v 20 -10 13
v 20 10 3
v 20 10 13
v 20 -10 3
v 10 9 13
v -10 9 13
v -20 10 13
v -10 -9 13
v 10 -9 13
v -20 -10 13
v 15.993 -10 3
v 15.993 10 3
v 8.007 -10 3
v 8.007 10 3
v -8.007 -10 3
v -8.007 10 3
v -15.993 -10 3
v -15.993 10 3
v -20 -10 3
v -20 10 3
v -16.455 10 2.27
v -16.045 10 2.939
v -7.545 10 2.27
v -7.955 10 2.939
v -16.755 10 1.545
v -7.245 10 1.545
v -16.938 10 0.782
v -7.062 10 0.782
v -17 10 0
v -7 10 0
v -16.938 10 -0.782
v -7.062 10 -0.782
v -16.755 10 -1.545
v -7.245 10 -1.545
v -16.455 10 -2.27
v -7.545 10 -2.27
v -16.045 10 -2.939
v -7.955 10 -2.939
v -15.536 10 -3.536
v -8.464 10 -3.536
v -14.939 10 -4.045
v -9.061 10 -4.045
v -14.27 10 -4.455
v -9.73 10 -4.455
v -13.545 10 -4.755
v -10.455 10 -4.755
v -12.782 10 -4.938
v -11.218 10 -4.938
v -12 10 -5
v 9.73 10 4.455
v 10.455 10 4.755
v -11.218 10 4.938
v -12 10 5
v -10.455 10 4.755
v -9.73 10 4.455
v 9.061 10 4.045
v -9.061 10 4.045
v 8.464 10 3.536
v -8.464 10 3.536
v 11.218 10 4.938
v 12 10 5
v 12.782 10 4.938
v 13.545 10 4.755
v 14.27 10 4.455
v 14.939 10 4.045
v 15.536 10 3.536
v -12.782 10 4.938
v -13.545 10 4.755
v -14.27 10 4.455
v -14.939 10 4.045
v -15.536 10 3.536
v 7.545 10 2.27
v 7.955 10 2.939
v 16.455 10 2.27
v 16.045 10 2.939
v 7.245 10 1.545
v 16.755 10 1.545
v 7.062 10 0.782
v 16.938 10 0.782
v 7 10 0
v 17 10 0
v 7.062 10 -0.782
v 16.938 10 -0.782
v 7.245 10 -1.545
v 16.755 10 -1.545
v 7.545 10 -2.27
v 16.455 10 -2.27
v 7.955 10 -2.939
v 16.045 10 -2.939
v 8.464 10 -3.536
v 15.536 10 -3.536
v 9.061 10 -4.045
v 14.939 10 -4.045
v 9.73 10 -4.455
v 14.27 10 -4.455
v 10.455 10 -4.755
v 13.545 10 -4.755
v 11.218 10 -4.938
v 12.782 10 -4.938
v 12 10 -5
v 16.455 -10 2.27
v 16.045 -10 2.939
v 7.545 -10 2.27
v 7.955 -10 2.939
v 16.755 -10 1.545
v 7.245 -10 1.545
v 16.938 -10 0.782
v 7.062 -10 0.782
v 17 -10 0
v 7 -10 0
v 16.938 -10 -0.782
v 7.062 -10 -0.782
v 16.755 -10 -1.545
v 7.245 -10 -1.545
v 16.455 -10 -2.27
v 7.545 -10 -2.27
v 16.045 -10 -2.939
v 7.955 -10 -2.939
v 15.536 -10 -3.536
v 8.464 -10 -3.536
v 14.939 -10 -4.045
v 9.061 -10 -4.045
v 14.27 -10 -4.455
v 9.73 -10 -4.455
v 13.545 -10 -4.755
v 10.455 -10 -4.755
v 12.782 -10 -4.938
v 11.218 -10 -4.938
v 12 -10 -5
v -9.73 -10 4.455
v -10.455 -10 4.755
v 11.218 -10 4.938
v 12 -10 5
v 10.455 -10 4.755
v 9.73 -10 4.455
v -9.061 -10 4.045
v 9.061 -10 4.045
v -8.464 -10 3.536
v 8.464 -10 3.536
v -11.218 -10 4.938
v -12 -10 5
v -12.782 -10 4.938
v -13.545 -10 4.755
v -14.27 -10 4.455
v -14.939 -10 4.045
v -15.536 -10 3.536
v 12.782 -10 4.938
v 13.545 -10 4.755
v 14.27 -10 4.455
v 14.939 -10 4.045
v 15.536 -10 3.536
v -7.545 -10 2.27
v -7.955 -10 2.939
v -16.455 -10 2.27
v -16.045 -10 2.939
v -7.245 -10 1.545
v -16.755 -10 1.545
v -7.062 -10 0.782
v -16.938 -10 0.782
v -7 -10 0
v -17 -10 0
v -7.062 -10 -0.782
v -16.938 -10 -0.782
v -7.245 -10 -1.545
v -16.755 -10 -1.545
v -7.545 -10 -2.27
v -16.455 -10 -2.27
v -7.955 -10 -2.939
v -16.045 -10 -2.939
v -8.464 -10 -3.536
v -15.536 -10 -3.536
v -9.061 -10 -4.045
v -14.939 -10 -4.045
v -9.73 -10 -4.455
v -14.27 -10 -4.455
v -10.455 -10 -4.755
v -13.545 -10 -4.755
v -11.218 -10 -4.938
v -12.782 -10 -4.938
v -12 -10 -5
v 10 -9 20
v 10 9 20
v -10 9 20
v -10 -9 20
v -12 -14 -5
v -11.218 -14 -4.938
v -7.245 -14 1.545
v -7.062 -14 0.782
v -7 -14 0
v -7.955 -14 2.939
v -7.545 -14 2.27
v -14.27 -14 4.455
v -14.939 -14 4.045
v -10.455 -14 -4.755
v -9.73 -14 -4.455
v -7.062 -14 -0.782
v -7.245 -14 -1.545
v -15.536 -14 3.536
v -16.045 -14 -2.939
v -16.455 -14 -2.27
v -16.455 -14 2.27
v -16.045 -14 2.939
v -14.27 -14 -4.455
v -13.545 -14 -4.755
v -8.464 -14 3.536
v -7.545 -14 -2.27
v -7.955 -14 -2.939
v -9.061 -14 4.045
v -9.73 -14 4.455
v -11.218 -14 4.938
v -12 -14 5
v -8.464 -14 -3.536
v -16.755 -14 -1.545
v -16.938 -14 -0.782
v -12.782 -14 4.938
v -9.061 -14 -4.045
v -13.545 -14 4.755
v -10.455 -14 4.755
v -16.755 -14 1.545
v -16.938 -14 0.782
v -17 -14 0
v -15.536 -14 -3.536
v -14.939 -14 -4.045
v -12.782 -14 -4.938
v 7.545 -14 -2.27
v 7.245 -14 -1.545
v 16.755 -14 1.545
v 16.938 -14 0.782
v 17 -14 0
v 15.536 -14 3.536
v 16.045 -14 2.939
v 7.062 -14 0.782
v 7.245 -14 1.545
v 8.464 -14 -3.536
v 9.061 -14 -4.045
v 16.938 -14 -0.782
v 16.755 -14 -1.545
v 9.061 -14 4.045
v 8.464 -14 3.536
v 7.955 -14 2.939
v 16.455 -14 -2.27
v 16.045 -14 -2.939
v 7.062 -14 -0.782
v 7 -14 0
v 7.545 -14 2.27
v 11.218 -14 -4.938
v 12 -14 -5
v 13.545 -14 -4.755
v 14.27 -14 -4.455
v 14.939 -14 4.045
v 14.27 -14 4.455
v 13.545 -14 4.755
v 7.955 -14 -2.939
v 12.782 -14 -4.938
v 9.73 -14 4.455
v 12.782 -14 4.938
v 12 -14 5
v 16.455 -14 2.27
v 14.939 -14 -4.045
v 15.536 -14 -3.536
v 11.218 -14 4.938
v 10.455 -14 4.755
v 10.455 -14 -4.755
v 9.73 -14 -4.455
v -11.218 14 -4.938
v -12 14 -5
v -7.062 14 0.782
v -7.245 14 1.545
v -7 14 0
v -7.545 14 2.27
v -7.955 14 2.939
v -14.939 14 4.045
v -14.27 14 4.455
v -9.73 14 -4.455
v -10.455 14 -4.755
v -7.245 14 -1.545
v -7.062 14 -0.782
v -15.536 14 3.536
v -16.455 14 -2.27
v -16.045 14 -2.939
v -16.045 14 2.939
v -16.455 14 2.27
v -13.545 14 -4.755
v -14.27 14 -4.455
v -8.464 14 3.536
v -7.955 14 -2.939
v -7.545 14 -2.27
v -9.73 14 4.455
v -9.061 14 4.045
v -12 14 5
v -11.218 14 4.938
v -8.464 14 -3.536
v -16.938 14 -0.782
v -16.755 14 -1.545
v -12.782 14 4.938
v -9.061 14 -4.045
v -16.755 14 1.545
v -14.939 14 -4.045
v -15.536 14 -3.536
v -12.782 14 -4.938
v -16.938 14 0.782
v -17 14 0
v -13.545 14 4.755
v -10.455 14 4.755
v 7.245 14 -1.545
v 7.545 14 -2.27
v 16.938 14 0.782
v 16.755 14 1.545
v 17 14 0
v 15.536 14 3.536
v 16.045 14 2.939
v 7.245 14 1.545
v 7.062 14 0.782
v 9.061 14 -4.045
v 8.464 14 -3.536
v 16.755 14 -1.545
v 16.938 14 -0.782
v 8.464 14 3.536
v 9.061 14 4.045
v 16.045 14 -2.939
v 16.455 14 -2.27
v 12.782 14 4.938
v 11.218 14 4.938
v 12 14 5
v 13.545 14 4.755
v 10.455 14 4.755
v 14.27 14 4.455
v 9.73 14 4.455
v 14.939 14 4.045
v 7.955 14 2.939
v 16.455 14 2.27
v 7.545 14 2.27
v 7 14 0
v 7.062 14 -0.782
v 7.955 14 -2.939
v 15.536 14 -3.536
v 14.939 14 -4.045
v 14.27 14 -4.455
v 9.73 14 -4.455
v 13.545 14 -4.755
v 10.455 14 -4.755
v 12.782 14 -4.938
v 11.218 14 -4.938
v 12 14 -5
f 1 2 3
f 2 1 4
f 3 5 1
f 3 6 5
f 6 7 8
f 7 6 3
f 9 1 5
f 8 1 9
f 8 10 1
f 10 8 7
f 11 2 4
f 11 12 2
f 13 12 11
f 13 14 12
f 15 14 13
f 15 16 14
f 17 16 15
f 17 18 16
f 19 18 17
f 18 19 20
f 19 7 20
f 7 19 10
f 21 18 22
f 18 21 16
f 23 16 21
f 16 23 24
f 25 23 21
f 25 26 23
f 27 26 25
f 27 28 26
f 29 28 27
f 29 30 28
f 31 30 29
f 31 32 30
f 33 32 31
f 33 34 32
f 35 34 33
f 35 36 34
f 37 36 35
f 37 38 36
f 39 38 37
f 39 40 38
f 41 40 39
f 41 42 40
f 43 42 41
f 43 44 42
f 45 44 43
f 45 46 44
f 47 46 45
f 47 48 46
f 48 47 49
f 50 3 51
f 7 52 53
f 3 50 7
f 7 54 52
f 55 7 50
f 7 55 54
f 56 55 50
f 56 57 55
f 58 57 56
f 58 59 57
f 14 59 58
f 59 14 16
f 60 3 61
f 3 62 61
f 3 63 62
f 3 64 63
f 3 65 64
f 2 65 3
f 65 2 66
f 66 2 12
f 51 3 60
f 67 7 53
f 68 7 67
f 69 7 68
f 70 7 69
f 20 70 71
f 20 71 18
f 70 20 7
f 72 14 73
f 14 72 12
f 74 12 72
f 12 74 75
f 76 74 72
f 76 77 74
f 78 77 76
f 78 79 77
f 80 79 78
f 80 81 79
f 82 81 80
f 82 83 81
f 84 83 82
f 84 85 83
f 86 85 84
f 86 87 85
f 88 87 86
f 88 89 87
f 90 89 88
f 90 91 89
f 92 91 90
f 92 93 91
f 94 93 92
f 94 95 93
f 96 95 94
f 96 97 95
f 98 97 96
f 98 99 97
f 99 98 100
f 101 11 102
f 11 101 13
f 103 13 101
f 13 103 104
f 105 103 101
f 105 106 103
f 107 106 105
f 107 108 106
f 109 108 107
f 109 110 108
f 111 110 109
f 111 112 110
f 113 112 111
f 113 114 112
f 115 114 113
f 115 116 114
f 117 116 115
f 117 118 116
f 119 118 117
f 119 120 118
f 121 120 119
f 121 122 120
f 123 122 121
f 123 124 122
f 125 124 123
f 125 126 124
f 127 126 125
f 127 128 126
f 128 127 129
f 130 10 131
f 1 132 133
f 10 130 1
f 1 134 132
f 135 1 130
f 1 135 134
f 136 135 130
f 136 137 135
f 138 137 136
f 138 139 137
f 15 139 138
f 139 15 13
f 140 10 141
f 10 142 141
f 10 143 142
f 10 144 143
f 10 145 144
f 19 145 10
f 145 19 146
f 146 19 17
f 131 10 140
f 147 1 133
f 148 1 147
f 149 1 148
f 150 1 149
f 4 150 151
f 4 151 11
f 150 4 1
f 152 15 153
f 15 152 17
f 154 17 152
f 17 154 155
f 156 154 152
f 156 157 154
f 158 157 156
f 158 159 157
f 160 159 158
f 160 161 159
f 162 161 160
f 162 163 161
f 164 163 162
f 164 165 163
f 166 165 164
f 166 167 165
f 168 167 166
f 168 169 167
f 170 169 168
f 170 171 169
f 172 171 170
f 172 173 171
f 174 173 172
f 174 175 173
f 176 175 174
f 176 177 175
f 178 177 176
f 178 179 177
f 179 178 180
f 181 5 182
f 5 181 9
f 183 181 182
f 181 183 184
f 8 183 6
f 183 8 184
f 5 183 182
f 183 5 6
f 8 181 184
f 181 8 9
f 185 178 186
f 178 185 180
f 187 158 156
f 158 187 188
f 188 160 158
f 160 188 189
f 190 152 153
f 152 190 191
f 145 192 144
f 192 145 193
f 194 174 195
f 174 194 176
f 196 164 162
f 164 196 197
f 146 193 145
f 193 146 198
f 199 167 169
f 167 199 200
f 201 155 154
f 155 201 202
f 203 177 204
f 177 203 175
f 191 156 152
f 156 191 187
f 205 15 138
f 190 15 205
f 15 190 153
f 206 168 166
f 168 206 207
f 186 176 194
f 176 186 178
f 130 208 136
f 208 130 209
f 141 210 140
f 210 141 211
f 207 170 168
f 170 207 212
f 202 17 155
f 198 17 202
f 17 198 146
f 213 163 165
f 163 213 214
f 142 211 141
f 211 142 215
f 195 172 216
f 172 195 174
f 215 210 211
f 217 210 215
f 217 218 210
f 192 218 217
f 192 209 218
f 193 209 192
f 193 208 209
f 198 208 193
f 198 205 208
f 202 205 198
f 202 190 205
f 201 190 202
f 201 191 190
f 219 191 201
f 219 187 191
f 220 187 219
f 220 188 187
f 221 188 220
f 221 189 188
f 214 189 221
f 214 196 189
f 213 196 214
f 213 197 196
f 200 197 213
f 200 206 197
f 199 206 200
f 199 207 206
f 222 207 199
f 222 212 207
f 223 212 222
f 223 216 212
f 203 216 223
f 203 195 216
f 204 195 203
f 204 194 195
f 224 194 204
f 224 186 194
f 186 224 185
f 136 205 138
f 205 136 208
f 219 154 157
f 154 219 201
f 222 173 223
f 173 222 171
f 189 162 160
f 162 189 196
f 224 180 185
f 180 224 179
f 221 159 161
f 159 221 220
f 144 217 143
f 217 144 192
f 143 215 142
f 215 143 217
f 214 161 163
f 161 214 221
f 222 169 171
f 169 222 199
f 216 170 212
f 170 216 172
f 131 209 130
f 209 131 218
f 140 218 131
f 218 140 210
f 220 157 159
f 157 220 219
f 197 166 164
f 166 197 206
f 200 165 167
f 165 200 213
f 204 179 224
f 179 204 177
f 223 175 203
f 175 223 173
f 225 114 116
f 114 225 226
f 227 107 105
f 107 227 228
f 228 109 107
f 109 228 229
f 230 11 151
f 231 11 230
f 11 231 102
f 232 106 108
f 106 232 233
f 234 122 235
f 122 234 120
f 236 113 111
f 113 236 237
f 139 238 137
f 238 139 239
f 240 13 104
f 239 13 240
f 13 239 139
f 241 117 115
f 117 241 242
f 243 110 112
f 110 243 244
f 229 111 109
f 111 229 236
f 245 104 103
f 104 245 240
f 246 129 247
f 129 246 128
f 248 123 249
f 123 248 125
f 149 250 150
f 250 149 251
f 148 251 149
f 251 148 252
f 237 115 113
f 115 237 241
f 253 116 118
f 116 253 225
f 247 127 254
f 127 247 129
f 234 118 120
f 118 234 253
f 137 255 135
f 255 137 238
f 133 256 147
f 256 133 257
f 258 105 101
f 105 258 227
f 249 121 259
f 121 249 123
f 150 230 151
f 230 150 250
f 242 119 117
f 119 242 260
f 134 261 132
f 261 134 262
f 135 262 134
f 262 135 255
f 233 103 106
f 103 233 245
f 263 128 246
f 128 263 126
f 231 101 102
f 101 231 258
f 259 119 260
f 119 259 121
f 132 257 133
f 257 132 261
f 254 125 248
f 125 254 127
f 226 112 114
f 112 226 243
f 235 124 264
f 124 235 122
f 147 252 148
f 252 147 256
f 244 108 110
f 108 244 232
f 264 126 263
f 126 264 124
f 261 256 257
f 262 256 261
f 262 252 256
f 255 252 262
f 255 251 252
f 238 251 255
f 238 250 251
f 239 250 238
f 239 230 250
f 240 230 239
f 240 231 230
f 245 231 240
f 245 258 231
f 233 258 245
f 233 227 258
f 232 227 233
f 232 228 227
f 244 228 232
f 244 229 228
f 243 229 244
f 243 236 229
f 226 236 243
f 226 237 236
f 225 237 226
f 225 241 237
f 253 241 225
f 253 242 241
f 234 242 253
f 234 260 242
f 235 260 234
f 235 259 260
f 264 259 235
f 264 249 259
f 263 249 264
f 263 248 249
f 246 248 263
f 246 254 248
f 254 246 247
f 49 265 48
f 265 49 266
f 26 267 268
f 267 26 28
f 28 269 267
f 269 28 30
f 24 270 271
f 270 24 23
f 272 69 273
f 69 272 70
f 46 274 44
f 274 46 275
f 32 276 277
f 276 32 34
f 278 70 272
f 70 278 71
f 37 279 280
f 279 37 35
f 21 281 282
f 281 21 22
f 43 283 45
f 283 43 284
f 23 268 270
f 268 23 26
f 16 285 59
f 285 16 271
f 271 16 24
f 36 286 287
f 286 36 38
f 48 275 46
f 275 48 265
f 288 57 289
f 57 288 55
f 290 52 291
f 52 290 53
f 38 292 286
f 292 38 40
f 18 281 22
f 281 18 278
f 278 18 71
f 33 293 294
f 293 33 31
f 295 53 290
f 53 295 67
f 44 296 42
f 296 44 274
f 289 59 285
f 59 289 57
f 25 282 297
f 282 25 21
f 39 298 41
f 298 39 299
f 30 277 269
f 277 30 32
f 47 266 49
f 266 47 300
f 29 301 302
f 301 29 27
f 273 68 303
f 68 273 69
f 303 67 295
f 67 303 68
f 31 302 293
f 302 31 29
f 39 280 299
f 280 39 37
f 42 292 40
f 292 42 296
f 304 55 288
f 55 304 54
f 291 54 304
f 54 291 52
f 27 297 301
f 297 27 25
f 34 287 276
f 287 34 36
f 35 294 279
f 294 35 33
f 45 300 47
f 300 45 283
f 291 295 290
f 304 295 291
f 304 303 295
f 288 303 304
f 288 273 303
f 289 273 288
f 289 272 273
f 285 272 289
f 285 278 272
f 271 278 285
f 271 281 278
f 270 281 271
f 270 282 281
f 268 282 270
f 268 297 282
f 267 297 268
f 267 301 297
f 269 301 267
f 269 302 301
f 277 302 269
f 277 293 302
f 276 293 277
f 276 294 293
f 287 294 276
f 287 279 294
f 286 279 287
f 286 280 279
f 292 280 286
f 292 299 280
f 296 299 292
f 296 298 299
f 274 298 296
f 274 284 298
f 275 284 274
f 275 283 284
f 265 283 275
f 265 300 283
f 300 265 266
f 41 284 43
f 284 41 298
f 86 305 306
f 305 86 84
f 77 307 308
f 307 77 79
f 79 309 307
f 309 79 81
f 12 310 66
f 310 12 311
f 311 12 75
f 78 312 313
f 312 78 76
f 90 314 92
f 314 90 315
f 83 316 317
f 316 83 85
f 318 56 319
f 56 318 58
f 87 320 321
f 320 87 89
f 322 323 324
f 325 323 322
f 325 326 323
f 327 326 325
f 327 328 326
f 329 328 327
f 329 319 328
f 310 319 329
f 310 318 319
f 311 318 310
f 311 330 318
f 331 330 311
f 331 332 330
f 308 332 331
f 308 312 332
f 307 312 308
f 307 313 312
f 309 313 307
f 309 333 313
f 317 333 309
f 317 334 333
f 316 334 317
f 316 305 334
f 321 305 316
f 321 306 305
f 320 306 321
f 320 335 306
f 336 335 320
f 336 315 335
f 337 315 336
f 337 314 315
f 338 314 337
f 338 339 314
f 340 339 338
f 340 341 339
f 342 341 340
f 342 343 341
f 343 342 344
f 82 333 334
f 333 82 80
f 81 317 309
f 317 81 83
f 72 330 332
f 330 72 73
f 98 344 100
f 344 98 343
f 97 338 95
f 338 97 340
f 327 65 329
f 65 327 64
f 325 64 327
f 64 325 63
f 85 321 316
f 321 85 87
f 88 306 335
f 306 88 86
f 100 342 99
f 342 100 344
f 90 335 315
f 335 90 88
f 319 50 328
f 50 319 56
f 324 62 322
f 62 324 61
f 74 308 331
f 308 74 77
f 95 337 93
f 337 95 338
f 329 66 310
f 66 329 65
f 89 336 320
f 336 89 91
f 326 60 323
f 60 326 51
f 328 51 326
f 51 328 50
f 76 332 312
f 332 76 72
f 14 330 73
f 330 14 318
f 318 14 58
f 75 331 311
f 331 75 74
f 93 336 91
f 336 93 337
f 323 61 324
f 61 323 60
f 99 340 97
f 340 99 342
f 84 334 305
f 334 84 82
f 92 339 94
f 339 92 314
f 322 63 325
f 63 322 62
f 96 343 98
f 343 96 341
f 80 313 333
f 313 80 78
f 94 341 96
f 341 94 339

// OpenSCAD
$fn = 40;


color("red")
translate([0, 0, 8])
cube([40, 20, 10], center=true);


color("blue")
translate([0, 0, 16])
cube([20, 18, 8], center=true);


module roue(x, y) {
    color("black")
    translate([x, y, 0])
    rotate([90, 0, 0])
    cylinder(h=4, r=5, center=true);
}

roue(-12, -12);
roue( 12, -12);
roue(-12,  12);
roue( 12,  12);
